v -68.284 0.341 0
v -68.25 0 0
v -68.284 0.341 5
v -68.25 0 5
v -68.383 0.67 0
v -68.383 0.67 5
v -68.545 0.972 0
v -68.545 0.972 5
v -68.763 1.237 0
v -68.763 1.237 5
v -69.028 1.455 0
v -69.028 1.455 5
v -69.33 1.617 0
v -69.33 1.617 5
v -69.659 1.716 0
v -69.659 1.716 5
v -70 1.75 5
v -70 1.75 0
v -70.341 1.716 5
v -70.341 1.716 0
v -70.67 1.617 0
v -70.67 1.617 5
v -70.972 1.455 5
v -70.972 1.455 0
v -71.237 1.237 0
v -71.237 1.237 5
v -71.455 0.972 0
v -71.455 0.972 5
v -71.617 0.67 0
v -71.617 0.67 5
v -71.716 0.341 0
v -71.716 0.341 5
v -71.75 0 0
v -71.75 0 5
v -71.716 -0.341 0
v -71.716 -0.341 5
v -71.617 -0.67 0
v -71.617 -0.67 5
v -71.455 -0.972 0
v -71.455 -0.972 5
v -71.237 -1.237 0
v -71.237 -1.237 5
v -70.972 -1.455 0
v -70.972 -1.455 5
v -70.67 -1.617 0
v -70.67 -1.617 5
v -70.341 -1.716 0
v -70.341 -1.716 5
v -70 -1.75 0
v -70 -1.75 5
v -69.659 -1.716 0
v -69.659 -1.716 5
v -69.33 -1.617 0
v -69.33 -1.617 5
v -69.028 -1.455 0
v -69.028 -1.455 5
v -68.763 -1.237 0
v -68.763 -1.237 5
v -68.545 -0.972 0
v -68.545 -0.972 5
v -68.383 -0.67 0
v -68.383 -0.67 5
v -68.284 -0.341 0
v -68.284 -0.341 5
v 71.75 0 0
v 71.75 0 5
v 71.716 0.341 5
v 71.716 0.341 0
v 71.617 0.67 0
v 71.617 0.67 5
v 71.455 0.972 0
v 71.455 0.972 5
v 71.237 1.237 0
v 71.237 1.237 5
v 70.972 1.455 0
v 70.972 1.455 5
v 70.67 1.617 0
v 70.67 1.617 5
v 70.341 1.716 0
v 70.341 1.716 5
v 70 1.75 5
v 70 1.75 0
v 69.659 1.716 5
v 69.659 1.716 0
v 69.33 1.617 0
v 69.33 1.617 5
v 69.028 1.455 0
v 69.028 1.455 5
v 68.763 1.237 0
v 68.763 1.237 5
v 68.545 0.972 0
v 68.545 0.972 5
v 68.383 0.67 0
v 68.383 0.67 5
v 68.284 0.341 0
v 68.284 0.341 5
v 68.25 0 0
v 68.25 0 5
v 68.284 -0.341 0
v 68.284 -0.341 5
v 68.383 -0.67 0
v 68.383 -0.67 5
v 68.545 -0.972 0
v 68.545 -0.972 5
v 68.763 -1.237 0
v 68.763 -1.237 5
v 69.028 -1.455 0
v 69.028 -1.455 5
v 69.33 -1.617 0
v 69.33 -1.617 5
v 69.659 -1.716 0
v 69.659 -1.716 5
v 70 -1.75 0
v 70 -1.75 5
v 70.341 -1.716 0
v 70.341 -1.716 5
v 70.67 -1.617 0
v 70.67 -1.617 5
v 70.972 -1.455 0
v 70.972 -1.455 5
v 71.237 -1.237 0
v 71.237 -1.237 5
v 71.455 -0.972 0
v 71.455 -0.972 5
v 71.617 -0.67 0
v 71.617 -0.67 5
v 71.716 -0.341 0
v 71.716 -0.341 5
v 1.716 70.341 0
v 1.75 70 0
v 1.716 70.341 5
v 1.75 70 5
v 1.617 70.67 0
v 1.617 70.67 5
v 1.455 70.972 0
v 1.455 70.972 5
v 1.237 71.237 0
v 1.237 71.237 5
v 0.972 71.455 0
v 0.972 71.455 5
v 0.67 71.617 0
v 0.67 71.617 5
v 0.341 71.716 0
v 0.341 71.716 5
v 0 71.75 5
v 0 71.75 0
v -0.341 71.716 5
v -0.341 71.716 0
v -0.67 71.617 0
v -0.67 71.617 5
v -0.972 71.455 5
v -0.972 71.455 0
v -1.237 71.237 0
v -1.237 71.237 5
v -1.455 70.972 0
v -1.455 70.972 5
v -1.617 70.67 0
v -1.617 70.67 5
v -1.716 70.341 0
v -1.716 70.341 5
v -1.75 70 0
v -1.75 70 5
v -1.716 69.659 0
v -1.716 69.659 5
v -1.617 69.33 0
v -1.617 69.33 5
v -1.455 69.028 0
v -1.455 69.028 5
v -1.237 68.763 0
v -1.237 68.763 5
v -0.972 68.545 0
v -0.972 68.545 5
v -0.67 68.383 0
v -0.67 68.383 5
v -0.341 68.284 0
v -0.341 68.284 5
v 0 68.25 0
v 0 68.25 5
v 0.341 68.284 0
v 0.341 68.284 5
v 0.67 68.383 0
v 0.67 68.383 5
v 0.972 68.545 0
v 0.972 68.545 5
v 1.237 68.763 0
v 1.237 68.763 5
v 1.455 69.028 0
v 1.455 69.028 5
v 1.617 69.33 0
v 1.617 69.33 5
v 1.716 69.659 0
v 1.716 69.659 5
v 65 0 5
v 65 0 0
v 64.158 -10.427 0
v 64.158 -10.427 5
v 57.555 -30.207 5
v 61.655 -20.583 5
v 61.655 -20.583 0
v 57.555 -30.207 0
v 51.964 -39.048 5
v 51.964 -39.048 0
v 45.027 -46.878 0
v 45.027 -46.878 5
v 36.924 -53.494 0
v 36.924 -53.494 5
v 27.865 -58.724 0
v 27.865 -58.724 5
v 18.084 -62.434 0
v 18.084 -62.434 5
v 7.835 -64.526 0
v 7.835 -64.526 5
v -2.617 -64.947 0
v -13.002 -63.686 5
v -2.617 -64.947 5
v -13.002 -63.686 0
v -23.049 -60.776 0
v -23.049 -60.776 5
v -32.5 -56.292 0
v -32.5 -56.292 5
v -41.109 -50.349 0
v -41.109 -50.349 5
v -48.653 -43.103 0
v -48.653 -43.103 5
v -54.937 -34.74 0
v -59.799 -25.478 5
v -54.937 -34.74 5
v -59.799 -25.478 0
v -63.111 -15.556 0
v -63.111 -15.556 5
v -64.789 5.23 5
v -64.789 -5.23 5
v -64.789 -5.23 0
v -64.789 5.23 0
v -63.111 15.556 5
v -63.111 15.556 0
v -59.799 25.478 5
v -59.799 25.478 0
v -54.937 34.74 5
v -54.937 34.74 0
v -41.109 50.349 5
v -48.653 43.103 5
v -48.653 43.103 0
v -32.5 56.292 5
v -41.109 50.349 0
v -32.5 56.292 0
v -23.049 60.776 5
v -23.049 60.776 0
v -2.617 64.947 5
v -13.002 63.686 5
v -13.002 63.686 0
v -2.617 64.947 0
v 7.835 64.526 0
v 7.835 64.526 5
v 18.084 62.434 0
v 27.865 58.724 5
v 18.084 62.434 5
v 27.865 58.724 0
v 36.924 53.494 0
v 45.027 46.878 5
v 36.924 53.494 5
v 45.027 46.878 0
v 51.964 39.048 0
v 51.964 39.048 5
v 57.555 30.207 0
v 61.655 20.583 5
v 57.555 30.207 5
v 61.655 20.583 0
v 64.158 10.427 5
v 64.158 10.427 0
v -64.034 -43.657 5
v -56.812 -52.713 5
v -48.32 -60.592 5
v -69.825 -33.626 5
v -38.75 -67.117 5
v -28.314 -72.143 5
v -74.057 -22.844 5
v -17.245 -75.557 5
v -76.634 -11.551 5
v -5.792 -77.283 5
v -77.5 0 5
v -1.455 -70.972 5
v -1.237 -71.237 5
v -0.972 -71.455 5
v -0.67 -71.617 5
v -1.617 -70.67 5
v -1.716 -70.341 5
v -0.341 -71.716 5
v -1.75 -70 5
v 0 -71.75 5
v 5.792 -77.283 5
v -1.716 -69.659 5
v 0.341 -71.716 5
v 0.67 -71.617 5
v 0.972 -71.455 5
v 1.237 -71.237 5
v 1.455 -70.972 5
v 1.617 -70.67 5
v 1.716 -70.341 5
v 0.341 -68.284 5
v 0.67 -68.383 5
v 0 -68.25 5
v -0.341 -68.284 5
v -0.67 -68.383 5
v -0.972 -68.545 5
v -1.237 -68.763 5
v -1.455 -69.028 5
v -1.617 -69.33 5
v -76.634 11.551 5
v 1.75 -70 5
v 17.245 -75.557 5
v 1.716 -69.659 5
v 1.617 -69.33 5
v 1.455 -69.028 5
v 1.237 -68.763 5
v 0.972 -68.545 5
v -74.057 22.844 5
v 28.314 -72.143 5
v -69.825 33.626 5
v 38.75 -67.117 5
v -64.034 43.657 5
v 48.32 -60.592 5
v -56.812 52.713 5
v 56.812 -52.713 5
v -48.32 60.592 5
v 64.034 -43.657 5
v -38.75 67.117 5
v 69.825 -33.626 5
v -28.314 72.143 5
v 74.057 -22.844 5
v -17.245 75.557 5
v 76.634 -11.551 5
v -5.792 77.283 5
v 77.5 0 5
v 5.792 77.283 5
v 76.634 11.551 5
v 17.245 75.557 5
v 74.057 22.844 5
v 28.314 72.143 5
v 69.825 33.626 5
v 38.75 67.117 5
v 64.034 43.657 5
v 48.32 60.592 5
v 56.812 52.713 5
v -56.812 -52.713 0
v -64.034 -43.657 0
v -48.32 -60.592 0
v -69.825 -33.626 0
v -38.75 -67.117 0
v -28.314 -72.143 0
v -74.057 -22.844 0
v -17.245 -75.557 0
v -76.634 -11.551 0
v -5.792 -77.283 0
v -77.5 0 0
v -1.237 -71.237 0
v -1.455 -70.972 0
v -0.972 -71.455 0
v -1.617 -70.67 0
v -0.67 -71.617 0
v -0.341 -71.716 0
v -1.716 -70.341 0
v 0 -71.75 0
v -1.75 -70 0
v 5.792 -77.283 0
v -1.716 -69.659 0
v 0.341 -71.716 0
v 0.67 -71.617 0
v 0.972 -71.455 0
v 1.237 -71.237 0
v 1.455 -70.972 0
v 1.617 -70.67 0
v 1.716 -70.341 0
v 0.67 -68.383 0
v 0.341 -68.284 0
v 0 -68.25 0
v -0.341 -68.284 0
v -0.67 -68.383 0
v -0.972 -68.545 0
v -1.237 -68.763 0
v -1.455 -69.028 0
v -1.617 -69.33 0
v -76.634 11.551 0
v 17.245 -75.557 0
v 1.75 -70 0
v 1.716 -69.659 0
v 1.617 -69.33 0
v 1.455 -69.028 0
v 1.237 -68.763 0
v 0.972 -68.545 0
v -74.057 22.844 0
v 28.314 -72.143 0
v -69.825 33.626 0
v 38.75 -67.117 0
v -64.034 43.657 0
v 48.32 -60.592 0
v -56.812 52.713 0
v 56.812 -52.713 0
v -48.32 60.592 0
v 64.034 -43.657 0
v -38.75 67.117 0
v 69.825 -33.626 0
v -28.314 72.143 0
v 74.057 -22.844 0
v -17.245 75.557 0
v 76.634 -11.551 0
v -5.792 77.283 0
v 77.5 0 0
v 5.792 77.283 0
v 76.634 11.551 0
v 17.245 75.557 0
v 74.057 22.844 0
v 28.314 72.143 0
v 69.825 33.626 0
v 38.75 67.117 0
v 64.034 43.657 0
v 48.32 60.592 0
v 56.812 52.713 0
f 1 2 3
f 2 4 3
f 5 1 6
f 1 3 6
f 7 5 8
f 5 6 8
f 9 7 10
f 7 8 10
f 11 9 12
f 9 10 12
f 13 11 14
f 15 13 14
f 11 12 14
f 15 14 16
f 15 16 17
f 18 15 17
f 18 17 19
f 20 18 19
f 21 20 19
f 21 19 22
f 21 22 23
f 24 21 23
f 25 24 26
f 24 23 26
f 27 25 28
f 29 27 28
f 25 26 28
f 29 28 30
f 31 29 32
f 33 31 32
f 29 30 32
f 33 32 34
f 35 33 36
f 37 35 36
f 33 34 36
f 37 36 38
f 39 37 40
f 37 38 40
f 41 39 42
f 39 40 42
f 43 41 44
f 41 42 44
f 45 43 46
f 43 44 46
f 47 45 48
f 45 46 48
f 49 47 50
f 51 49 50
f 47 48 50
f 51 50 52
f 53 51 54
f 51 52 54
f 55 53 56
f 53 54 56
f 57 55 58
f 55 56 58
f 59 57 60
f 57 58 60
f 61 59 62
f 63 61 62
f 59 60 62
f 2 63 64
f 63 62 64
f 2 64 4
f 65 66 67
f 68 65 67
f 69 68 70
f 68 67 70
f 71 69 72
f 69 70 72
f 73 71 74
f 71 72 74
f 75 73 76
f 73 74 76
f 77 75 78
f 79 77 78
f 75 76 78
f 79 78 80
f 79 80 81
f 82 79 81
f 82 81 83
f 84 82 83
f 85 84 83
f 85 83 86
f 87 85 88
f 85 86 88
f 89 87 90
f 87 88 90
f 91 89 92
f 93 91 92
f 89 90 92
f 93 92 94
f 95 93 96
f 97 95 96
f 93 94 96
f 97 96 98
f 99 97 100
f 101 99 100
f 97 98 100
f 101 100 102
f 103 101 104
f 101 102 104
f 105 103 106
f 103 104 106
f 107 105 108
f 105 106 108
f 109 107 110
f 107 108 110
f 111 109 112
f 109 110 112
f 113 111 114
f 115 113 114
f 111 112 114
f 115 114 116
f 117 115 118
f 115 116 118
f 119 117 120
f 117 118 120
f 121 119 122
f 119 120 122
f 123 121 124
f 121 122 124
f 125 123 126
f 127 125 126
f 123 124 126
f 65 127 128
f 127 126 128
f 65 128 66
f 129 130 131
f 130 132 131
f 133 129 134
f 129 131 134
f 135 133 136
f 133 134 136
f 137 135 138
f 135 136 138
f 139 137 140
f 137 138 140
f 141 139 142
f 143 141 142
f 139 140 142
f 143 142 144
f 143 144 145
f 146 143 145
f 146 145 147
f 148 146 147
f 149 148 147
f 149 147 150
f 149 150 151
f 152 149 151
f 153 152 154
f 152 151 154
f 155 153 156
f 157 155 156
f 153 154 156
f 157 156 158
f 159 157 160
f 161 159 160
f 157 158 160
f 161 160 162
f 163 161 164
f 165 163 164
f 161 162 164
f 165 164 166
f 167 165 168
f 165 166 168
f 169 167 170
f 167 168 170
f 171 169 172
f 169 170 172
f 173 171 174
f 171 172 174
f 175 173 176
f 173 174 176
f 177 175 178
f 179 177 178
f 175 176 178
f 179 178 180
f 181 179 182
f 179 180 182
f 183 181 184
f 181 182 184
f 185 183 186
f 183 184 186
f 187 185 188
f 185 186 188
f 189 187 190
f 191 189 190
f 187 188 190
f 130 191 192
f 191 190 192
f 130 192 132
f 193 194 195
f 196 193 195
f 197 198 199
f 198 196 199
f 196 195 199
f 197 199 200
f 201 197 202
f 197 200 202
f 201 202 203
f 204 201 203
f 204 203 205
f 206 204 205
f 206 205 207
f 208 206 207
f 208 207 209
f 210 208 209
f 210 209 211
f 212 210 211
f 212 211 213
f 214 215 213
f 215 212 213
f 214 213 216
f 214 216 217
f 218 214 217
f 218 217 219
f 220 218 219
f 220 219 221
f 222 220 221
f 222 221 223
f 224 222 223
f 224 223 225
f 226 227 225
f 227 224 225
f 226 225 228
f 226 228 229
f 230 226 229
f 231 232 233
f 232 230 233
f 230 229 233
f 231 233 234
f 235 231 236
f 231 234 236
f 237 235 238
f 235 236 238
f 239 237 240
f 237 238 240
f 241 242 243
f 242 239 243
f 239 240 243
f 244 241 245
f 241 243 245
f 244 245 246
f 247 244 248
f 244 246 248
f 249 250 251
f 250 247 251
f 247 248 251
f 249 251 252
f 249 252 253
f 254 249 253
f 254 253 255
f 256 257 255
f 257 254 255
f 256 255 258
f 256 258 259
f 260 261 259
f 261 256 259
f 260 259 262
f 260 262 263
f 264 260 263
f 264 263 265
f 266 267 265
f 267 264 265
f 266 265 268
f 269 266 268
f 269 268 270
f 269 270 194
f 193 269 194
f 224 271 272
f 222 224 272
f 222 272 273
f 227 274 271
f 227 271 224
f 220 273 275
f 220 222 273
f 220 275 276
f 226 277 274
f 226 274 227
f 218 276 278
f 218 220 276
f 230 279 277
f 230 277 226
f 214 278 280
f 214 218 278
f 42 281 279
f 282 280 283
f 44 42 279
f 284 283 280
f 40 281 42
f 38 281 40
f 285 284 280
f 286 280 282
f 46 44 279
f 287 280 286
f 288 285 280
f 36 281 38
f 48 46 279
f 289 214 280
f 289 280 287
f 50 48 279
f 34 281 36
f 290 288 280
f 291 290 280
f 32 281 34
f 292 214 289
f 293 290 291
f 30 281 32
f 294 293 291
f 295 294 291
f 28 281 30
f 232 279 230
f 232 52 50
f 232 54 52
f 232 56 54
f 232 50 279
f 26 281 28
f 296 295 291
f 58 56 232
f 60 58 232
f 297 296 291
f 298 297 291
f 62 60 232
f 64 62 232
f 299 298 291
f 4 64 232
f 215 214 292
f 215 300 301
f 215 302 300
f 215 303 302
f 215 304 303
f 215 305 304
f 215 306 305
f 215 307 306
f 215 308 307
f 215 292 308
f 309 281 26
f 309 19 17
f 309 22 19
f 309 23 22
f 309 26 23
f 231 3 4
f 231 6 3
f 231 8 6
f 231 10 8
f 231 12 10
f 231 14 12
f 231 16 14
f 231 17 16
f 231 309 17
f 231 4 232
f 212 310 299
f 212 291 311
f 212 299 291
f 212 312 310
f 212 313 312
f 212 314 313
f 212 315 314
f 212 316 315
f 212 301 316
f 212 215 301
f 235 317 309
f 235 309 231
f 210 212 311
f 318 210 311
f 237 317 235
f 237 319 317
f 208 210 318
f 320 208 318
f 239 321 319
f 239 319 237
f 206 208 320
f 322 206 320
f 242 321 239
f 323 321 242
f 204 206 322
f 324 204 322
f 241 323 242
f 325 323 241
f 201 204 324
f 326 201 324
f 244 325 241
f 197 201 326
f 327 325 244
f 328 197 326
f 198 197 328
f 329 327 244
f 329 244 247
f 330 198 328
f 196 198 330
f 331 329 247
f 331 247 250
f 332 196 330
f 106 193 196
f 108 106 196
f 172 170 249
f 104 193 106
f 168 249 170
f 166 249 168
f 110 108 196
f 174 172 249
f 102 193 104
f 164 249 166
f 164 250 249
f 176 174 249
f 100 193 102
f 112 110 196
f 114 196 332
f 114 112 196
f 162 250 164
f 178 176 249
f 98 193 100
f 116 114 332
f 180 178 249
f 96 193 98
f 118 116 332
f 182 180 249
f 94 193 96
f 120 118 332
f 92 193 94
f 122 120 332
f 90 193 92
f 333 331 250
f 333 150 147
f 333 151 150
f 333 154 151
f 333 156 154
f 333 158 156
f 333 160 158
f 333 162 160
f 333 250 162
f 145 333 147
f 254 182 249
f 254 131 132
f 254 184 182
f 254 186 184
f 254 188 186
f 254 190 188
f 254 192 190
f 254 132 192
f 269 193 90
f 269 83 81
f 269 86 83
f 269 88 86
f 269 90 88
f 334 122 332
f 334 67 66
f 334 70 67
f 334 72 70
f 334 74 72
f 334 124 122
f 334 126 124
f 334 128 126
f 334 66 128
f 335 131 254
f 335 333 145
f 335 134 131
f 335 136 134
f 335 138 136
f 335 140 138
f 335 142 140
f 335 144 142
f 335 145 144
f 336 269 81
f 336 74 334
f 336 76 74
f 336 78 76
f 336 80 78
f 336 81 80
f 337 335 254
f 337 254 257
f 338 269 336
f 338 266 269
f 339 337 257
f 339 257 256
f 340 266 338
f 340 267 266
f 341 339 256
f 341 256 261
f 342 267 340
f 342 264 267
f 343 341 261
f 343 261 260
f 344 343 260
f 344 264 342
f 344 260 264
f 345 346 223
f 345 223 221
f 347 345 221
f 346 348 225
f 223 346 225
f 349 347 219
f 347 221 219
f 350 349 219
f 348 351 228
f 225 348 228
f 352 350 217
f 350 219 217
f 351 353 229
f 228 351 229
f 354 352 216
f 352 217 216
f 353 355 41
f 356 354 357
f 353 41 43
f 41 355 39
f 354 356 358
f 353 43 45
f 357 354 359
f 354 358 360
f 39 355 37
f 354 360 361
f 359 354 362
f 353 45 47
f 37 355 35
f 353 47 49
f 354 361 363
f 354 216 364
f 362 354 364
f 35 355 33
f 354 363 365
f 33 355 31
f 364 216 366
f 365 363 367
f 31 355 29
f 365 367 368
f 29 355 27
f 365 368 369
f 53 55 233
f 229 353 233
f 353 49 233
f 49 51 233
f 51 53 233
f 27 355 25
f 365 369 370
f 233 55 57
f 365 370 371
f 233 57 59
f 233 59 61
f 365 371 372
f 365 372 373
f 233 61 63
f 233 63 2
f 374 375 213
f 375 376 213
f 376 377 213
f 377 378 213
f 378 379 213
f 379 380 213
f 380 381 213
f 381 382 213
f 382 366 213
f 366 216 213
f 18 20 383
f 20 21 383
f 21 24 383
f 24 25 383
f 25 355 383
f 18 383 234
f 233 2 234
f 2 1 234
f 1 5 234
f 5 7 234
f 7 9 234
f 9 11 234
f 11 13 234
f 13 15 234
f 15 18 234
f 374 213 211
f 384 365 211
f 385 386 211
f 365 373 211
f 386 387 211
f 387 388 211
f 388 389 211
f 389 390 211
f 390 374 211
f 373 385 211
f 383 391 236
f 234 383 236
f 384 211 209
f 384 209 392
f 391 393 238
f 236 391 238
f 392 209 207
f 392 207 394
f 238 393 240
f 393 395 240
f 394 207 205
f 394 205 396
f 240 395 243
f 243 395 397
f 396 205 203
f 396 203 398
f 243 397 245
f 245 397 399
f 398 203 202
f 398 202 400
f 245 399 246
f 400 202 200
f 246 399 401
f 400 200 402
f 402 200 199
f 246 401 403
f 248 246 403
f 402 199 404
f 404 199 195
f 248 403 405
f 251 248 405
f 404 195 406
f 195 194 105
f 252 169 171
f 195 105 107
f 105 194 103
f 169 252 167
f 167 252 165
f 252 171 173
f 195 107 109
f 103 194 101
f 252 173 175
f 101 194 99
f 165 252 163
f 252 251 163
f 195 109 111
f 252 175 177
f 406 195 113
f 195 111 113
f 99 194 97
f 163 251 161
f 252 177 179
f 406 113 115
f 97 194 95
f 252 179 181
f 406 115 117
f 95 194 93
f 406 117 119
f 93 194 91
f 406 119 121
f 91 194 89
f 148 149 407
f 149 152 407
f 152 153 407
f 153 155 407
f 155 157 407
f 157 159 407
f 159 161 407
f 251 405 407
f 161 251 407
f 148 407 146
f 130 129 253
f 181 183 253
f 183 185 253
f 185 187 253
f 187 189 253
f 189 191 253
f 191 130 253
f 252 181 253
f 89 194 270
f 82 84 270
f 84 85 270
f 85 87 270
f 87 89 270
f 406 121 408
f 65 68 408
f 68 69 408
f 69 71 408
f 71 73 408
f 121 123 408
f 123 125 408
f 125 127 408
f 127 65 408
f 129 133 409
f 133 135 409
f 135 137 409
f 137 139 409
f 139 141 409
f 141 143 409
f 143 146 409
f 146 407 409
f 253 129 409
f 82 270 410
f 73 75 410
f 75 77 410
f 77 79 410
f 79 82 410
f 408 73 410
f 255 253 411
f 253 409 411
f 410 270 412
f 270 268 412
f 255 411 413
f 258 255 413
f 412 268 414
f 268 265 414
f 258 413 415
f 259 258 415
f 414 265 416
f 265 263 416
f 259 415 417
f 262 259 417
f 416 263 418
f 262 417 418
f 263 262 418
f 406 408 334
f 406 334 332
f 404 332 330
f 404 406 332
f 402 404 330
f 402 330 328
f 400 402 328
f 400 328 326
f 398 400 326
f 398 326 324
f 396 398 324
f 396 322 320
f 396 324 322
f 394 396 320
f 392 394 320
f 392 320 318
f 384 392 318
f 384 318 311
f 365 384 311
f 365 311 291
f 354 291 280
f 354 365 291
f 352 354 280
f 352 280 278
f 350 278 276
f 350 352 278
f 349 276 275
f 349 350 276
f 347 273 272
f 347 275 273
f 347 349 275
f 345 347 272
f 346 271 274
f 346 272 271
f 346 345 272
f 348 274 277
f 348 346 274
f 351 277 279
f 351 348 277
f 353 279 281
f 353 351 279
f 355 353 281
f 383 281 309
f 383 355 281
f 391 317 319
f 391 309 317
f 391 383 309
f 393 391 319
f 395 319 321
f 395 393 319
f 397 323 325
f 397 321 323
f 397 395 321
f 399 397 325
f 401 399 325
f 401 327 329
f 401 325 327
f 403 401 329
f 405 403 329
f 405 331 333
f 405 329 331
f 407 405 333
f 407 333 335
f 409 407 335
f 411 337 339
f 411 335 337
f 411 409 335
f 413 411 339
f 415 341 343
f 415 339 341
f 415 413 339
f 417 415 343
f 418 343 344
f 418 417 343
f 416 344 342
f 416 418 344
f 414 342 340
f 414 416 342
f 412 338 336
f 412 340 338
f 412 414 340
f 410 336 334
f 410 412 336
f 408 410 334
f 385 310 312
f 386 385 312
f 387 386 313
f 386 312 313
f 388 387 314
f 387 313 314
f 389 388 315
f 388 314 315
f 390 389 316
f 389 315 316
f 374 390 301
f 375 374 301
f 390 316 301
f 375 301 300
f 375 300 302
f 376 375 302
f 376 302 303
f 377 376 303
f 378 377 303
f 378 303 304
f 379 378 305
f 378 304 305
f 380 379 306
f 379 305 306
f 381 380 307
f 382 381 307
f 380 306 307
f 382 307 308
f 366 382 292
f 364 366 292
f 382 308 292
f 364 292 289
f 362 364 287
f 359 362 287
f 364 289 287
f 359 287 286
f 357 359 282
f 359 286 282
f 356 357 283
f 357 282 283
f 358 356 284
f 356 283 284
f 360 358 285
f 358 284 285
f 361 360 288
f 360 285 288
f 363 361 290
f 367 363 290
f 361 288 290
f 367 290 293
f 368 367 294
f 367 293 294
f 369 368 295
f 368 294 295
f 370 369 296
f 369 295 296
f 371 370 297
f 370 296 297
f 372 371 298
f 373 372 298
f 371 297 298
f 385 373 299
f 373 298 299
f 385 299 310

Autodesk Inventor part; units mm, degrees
ref_plane "YZ Plane" through (0, 0, 0) normal (1, 0, 0) x (0, 1, 0)
ref_plane "XZ Plane" through (0, 0, 0) normal (0, 1, 0) x (-1, 0, 0)
ref_plane "XY Plane" through (0, 0, 0) normal (0, 0, 1) x (1, 0, 0)
sketch "스케치1" plane through (0, 0, 0) normal (0, 0, 1) x (1, 0, 0)
  circle A0 centre (0, 0) radius 77.5
  circle A1 centre (0, 0) radius 65
  dimension "d0" = 155
  dimension "d1" = 130
extrude "돌출1" add sketch "스케치1" along normal blind 5
sketch "스케치2" plane through (0, 0, 5) normal (0, 0, 1) x (1, 0, 0)
  circle A0 centre (0, 70) radius 1.75
  circle A1 centre (-70, 0) radius 1.75
  circle A2 centre (0, -70) radius 1.75
  circle A3 centre (70, 0) radius 1.75
  point P0 (0, 0)
  dimension "d4" = 3.5
  dimension "d5" = 70
  dimension "d8" = 360
extrude "돌출2" cut sketch "스케치2" against normal blind 5
properties part number "아크릴 고정판"
